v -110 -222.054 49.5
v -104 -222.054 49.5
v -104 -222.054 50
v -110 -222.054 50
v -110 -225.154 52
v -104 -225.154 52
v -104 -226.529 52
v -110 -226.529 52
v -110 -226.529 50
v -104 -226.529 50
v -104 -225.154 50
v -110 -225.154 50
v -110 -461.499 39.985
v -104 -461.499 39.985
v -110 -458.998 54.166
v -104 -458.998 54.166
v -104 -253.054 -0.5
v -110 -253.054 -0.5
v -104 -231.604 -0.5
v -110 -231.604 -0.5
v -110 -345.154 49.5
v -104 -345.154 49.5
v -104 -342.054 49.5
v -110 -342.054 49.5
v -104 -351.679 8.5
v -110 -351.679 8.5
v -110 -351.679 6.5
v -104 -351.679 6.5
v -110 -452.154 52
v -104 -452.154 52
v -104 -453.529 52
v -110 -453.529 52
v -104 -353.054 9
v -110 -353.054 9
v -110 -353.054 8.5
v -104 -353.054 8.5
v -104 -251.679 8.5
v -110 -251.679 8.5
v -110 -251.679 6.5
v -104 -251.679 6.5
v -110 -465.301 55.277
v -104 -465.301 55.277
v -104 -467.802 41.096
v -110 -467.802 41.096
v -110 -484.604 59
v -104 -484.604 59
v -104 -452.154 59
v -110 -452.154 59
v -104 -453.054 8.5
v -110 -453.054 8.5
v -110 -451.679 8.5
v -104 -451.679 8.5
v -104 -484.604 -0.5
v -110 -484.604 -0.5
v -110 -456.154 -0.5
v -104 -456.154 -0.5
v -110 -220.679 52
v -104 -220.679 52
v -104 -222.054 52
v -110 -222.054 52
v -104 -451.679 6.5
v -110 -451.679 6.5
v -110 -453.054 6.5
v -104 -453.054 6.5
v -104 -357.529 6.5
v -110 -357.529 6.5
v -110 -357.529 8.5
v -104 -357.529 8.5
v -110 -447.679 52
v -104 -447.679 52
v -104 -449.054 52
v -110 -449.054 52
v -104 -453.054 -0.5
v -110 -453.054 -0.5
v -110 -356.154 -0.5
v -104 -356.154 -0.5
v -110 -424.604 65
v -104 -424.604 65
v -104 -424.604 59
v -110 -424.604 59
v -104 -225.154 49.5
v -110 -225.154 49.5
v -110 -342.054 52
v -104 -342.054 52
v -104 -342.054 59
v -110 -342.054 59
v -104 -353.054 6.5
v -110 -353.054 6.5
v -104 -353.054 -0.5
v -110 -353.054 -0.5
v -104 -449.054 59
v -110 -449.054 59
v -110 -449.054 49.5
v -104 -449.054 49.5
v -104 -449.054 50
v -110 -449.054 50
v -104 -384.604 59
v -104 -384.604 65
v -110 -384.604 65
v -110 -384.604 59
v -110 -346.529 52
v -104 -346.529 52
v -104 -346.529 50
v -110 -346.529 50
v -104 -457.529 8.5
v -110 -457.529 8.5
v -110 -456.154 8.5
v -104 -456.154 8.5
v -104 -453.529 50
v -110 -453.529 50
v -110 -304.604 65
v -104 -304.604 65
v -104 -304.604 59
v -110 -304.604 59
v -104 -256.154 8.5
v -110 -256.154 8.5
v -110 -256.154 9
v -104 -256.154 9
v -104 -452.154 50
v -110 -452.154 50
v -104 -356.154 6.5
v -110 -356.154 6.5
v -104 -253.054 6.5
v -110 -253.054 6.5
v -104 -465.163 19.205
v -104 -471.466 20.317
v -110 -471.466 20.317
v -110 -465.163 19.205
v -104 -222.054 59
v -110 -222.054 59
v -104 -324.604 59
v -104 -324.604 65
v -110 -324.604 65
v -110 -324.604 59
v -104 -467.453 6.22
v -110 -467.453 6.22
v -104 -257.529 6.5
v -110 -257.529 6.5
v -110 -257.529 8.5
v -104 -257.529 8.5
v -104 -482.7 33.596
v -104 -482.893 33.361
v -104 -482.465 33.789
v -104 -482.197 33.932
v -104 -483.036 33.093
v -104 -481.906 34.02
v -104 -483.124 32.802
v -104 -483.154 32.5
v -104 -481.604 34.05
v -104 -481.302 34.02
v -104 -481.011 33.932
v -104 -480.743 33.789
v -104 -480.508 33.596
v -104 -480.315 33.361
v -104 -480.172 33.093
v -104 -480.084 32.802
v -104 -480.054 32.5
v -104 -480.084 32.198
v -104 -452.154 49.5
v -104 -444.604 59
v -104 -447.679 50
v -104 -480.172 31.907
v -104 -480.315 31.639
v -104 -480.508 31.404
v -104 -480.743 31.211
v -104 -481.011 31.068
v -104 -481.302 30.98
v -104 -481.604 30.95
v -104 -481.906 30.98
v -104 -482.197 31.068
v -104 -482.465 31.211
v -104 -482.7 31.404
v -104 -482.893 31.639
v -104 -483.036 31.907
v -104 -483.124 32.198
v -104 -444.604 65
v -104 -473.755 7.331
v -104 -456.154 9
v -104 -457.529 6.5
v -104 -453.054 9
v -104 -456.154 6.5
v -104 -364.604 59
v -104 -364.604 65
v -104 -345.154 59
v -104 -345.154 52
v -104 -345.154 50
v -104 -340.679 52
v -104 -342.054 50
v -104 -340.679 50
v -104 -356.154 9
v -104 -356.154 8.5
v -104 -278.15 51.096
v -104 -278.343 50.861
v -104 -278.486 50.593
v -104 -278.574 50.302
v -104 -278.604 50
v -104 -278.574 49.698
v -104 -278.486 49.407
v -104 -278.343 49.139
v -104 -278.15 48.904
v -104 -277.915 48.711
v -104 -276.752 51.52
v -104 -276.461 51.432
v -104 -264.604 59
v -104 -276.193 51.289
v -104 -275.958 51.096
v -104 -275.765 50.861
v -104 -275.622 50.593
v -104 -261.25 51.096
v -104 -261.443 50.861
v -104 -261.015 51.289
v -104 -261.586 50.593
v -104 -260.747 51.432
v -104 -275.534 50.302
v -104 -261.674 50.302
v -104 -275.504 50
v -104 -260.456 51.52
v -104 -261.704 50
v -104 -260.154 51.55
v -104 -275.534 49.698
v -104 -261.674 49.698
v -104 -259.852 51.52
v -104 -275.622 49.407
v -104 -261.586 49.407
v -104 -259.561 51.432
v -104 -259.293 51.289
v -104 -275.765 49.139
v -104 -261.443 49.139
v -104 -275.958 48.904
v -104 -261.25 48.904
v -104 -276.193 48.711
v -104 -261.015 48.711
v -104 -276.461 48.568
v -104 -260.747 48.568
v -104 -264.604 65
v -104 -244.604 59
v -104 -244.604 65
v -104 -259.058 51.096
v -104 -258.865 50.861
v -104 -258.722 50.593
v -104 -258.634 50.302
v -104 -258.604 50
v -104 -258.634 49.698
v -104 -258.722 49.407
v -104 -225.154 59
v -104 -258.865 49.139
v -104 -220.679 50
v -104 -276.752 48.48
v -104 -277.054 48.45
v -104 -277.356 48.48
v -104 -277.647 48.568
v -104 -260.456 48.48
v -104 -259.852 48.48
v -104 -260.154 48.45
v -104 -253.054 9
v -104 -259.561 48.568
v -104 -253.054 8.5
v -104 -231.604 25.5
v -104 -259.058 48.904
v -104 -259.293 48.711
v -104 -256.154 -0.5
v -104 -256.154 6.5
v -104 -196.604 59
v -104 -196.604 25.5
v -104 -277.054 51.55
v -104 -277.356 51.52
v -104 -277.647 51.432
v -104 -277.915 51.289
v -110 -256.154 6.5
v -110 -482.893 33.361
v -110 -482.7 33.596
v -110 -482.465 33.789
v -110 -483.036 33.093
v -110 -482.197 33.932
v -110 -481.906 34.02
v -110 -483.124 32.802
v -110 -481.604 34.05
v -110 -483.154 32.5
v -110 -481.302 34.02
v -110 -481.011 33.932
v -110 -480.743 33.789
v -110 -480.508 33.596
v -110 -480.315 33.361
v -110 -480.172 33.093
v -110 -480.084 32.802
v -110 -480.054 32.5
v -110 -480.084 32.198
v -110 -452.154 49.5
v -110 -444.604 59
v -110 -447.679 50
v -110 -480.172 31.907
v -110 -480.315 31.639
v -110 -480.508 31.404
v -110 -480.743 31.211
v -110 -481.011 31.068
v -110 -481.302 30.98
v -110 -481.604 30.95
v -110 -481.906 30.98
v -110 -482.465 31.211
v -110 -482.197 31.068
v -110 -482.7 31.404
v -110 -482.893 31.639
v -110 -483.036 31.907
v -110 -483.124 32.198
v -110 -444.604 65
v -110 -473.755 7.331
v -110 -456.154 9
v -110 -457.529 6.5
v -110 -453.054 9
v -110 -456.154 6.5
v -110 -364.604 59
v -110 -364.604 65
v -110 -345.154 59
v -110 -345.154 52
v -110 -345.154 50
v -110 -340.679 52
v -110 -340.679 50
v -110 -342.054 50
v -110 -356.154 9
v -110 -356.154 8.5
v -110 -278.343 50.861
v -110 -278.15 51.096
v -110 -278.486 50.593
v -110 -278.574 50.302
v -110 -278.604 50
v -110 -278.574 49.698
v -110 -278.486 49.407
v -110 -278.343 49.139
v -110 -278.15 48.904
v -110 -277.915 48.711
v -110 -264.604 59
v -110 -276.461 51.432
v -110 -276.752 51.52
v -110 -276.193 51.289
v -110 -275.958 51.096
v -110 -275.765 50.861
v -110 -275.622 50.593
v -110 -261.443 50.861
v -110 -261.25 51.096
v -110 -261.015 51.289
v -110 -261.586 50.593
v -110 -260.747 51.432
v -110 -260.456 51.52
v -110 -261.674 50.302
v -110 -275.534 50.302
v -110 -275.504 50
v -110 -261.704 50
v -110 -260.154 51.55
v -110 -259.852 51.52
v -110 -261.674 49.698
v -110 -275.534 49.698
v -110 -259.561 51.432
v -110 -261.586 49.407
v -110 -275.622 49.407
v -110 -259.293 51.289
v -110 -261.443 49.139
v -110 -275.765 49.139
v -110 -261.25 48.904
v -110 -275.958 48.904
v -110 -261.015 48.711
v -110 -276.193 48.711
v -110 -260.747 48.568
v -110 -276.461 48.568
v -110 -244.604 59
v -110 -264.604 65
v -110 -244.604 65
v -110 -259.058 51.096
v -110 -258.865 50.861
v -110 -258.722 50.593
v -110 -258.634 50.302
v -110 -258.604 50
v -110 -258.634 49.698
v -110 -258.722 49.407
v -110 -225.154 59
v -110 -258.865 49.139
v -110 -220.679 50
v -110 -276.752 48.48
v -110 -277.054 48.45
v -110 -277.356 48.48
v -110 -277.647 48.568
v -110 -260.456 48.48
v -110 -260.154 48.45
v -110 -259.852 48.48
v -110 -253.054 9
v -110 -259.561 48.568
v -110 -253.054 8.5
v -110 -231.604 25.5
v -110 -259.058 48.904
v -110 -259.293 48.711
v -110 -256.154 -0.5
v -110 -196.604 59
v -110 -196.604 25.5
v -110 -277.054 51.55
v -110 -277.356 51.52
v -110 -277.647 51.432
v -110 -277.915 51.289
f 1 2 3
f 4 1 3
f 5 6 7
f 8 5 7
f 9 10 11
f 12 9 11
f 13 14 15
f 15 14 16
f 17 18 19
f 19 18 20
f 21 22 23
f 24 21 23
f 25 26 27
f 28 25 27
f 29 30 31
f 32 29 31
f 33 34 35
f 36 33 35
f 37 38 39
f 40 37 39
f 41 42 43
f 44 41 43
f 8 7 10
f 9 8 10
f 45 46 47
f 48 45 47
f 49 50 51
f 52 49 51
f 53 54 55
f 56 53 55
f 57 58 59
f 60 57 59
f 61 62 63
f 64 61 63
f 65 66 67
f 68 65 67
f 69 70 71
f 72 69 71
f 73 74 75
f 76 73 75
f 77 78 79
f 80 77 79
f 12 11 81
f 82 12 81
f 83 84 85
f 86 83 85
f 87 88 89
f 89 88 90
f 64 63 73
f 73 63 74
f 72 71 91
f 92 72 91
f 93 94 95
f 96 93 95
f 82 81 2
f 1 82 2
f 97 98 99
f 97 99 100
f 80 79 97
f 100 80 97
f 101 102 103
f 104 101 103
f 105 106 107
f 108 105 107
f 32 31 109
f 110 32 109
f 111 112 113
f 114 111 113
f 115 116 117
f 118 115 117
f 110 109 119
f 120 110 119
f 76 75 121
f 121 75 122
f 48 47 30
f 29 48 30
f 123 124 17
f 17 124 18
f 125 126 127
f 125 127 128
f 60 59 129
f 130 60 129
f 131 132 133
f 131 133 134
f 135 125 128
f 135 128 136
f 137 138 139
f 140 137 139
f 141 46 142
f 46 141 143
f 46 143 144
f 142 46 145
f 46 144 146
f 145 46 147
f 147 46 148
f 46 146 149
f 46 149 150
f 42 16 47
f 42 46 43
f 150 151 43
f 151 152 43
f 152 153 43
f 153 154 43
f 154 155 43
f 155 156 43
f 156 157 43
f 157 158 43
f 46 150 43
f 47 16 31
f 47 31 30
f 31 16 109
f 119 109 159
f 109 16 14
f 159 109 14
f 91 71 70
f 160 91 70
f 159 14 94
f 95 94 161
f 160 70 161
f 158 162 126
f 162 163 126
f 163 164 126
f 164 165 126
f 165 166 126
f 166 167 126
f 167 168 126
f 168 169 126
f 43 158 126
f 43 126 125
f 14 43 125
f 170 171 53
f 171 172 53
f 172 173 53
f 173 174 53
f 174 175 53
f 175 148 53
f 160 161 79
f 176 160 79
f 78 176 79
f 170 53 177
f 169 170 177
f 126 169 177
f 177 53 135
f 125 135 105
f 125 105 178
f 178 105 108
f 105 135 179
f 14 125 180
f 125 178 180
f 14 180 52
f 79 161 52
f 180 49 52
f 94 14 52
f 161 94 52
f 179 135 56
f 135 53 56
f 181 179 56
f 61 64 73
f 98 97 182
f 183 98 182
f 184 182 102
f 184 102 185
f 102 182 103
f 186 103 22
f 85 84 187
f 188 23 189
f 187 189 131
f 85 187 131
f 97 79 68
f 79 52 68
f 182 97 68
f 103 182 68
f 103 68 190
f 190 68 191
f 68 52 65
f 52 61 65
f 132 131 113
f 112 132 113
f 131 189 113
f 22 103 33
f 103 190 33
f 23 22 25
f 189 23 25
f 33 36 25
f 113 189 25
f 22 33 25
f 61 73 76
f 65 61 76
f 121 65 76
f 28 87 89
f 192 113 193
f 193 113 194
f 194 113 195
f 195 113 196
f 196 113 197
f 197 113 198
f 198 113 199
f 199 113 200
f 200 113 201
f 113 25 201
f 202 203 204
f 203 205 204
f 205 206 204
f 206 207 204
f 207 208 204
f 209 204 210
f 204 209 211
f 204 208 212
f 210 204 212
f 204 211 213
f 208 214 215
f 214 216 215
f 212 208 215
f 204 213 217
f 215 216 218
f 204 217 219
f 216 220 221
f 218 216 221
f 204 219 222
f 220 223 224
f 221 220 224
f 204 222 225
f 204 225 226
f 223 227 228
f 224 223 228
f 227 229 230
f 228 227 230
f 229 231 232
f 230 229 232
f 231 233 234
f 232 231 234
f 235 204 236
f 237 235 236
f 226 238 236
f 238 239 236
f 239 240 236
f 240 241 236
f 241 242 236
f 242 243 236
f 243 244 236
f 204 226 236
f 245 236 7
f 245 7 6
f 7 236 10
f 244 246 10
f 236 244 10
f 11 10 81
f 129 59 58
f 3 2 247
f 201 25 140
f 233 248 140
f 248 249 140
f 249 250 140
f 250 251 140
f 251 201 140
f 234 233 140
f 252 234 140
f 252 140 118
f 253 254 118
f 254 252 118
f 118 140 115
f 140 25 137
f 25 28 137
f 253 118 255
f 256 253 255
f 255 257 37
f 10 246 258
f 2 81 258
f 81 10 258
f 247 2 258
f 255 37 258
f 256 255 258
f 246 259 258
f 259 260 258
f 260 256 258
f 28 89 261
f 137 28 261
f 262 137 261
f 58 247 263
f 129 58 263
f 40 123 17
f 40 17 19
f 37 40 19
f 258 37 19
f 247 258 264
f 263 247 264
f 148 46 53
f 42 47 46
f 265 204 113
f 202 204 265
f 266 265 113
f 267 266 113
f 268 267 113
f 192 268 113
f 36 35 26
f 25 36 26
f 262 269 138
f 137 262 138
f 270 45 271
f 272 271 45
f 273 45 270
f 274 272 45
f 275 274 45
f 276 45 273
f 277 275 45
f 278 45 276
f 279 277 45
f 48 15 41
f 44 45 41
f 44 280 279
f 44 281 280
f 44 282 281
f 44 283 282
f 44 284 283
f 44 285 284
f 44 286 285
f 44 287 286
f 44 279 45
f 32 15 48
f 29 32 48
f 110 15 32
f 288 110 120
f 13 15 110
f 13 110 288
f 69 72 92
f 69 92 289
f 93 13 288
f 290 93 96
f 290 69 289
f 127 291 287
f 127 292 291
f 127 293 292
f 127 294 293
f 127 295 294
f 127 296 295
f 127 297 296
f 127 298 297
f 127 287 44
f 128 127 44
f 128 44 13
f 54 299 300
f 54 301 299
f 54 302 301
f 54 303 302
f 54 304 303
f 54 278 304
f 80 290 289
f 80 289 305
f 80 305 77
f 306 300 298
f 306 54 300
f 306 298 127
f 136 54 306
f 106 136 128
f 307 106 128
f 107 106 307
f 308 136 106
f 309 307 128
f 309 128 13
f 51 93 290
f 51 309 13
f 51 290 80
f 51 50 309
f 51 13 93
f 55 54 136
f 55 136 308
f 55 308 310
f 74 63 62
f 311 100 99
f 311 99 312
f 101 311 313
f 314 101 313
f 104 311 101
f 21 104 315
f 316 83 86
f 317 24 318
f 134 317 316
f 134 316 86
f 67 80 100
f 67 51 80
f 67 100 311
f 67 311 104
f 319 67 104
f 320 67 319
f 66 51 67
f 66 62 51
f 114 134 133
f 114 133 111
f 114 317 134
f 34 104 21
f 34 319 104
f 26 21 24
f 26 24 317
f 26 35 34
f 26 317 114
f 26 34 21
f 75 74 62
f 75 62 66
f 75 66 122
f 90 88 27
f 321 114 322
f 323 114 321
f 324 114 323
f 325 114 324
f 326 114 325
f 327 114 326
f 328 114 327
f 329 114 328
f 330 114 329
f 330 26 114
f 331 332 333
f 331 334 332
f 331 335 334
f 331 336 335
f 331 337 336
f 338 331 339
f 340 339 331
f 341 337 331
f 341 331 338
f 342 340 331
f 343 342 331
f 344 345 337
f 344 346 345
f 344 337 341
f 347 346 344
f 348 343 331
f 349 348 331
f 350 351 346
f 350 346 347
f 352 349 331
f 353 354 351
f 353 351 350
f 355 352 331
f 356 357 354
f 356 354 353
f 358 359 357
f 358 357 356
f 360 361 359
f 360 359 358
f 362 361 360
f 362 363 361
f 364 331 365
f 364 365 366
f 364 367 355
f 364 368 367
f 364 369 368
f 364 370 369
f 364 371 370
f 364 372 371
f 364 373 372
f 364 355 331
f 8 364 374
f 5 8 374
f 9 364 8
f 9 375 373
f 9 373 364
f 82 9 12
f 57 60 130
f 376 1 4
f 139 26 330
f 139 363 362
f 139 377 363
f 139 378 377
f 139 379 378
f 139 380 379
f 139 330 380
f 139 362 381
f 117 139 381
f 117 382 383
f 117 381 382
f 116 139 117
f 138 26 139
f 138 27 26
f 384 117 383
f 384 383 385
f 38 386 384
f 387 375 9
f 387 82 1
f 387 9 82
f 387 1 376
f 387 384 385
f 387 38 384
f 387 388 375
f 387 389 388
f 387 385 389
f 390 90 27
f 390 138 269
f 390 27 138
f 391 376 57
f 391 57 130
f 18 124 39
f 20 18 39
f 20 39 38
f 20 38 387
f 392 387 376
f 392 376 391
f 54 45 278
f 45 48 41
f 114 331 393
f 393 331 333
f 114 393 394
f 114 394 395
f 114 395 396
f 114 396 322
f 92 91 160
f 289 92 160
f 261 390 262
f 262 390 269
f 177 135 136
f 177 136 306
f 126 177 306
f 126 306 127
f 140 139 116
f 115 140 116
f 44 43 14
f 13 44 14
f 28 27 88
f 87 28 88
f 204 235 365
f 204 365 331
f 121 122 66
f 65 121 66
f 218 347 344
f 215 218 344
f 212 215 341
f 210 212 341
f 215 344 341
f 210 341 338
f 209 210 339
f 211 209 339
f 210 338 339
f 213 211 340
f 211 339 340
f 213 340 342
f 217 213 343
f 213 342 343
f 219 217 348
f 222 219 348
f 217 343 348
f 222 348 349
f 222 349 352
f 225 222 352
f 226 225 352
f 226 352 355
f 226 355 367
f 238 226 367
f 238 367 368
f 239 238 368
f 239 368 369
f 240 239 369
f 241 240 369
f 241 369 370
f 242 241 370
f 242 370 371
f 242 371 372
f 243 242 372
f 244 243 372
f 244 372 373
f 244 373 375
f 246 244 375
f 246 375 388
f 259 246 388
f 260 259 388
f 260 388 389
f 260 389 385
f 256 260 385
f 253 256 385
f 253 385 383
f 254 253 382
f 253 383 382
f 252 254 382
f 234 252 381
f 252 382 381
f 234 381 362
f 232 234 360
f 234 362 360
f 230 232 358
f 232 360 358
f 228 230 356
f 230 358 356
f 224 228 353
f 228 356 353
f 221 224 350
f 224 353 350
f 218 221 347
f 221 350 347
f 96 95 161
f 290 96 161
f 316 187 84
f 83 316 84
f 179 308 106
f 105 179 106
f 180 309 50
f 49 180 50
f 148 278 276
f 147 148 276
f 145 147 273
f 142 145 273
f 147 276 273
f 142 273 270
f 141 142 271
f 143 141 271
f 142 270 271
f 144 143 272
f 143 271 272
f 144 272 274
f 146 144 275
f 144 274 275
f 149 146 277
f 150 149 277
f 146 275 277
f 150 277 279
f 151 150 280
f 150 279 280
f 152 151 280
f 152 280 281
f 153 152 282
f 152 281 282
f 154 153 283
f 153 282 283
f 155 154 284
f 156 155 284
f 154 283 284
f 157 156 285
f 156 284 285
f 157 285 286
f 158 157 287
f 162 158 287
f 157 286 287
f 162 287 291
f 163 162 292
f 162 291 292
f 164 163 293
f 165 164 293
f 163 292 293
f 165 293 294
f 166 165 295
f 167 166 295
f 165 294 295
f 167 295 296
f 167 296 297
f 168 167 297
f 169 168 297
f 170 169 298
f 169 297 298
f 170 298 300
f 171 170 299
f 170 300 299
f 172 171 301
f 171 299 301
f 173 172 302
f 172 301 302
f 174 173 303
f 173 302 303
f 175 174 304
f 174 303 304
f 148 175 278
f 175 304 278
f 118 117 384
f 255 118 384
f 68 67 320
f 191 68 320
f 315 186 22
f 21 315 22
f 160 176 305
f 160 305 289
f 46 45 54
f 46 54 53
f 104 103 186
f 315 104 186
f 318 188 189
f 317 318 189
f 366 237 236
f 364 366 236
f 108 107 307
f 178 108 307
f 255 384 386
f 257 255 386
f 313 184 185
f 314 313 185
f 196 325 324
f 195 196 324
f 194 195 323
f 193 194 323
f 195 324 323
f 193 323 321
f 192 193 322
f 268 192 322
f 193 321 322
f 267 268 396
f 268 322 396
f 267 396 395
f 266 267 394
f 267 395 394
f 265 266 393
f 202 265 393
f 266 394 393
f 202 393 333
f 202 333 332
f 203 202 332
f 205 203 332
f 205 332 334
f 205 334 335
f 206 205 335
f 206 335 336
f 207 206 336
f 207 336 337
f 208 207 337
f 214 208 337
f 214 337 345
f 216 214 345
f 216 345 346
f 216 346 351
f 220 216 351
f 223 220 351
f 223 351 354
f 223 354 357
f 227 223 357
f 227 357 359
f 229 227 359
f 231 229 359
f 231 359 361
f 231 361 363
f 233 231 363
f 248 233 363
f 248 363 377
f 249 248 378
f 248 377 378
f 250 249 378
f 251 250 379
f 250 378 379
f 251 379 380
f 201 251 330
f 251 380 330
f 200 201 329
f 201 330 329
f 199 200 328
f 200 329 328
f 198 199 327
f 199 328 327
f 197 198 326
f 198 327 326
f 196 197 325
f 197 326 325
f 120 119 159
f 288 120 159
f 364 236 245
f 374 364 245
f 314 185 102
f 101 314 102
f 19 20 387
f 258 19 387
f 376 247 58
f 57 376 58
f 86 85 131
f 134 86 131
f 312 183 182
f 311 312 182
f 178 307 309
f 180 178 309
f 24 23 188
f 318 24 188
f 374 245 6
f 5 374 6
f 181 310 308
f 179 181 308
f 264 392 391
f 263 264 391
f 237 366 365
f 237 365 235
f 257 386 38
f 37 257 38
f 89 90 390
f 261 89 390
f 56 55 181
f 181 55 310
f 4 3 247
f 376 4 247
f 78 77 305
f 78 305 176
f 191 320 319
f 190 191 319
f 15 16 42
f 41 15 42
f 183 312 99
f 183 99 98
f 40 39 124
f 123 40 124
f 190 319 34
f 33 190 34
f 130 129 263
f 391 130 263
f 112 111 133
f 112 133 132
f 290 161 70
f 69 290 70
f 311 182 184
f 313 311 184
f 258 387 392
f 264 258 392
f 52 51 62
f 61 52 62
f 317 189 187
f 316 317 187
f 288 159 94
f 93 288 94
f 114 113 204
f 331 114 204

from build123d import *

# Parameters (mm, degrees)
DODANIE_WYCI_GNI_CIE1_DEPTH      = 65
DODANIE_WYCI_GNI_CIE1_DEPTH_BACK = 6.5
SZKIC1_W                         = 6
SZKIC1_H                         = 318
WYTNIJ_WYCI_GNI_CIE1_DEPTH       = 6
SZKIC4_W                         = 6
SZKIC4_H                         = 253
WYTNIJ_WYCI_GNI_CIE2_DEPTH       = 6
WYTNIJ_WYCI_GNI_CIE3_DEPTH       = 6
SZYK_LINIOWY2_COUNT              = 2
SZYK_LINIOWY2_PITCH              = 100
SZYK_LINIOWY2_COL_COUNT          = 2
SZYK_LINIOWY2_COL_PITCH          = 200
SZKIC6_W                         = 6
SZKIC6_H                         = 40
WYTNIJ_WYCI_GNI_CIE4_DEPTH       = 6
SZYK_LINIOWY3_COUNT              = 6
SZYK_LINIOWY3_PITCH              = 60
SZYK_LINIOWY3_COUNT_DIR2         = 2
SZYK_LINIOWY3_PITCH_DIR2         = 250
WYTNIJ_WYCI_GNI_CIE5_DEPTH       = 6
SZYK_LINIOWY4_COUNT              = 2
SZYK_LINIOWY4_PITCH              = 107
SZYK_LINIOWY4_COL_COUNT          = 2
SZYK_LINIOWY4_COL_PITCH          = 227
SZKIC9_R                         = 1.55
WYTNIJ_WYCI_GNI_CIE6_DEPTH       = 6
WYTNIJ_WYCI_GNI_CIE7_DEPTH       = 6
SZKIC13_R                        = 1.55
WYTNIJ_WYCI_GNI_CIE9_DEPTH       = 10


with BuildPart() as part:
    # Szkic1 → Dodanie-wyciągnięcie1 (new, two sides: drawn at the far end of the back side and taken through both)
    with BuildSketch(Plane.XY.offset(-DODANIE_WYCI_GNI_CIE1_DEPTH_BACK)):
        with Locations((-107, -325.603962956)):
            Rectangle(SZKIC1_W, SZKIC1_H)
    extrude(amount=DODANIE_WYCI_GNI_CIE1_DEPTH + DODANIE_WYCI_GNI_CIE1_DEPTH_BACK)

    # Szkic2 → Wytnij-wyciągnięcie1 (cut)
    with BuildSketch(Plane.ZY.offset(110)):
        Polygon((-6.5, -231.603962956), (25.5, -231.603962956), (25.5, -196.603962956), (65, -196.603962956), (65, -166.603962956), (-6.5, -166.603962956), align=None)
    extrude(amount=-WYTNIJ_WYCI_GNI_CIE1_DEPTH, mode=Mode.SUBTRACT)

    # Szkic4 → Wytnij-wyciągnięcie2 (cut)
    with BuildSketch(Plane.ZY.offset(110)):
        with Locations((-3.5, -358.103962956)):
            Rectangle(SZKIC4_W, SZKIC4_H)
    extrude(amount=-WYTNIJ_WYCI_GNI_CIE2_DEPTH, mode=Mode.SUBTRACT)

    # Szkic5 → Wytnij-wyciągnięcie3 (cut)
    with BuildSketch(Plane.ZY.offset(110)):
        Polygon((-0.5, -453.053962956), (-0.5, -456.153962956), (6.5, -456.153962956), (6.5, -457.528962956), (8.5, -457.528962956), (8.5, -456.153962956), (9, -456.153962956), (9, -453.053962956), (8.5, -453.053962956), (8.5, -451.678962956), (6.5, -451.678962956), (6.5, -453.053962956), align=None)
    wytnij_wyci_gni_cie3 = extrude(amount=-WYTNIJ_WYCI_GNI_CIE3_DEPTH, mode=Mode.SUBTRACT)

    # Szyk liniowy2: Wytnij-wyciągnięcie3 ×2
    with Locations(*[(0, i * SZYK_LINIOWY2_PITCH, 0) for i in range(1, SZYK_LINIOWY2_COUNT)]):
        add(wytnij_wyci_gni_cie3, mode=Mode.SUBTRACT)

    # Szyk liniowy2 col: Wytnij-wyciągnięcie3 ×2
    with Locations(*[(0, i * SZYK_LINIOWY2_COL_PITCH, 0) for i in range(1, SZYK_LINIOWY2_COL_COUNT)]):
        add(wytnij_wyci_gni_cie3, mode=Mode.SUBTRACT)

    # Szkic6 → Wytnij-wyciągnięcie4 (cut)
    with BuildSketch(Plane(origin=(-104, 0, 0), x_dir=(0, 0, -1), z_dir=(1, 0, 0))):
        with Locations((-62, -464.603962956)):
            Rectangle(SZKIC6_W, SZKIC6_H)
    wytnij_wyci_gni_cie4 = extrude(amount=-WYTNIJ_WYCI_GNI_CIE4_DEPTH, mode=Mode.SUBTRACT)

    # Szyk liniowy3: Wytnij-wyci_gni_cie4 6 × 2
    with Locations(*[Vector(0, 1, 0) * (i * SZYK_LINIOWY3_PITCH) + Vector(0, 1, 0) * (j * SZYK_LINIOWY3_PITCH_DIR2) for i in range(SZYK_LINIOWY3_COUNT) for j in range(SZYK_LINIOWY3_COUNT_DIR2) if (i, j) != (0, 0)]):
        add(wytnij_wyci_gni_cie4, mode=Mode.SUBTRACT)

    # Szkic7 → Wytnij-wyciągnięcie5 (cut)
    with BuildSketch(Plane(origin=(-104, 0, 0), x_dir=(0, 0, -1), z_dir=(1, 0, 0))):
        Polygon((-59, -449.053962956), (-59, -452.153962956), (-52, -452.153962956), (-52, -453.528962956), (-50, -453.528962956), (-50, -452.153962956), (-49.5, -452.153962956), (-49.5, -449.053962956), (-50, -449.053962956), (-50, -447.678962956), (-52, -447.678962956), (-52, -449.053962956), align=None)
    wytnij_wyci_gni_cie5 = extrude(amount=-WYTNIJ_WYCI_GNI_CIE5_DEPTH, mode=Mode.SUBTRACT)

    # Szyk liniowy4: Wytnij-wyciągnięcie5 ×2
    with Locations(*[(0, i * SZYK_LINIOWY4_PITCH, 0) for i in range(1, SZYK_LINIOWY4_COUNT)]):
        add(wytnij_wyci_gni_cie5, mode=Mode.SUBTRACT)

    # Szyk liniowy4 col: Wytnij-wyciągnięcie5 ×2
    with Locations(*[(0, i * SZYK_LINIOWY4_COL_PITCH, 0) for i in range(1, SZYK_LINIOWY4_COL_COUNT)]):
        add(wytnij_wyci_gni_cie5, mode=Mode.SUBTRACT)

    # Szkic9 → Wytnij-wyciągnięcie6 (cut)
    with BuildSketch(Plane.ZY.offset(110)):
        with Locations(Location((32.500000044, -481.603962956, 0), (0, 0, 270))):
            Circle(SZKIC9_R)
    extrude(amount=-WYTNIJ_WYCI_GNI_CIE6_DEPTH, mode=Mode.SUBTRACT)

    # Szkic11 → Wytnij-wyciągnięcie7 (cut)
    with BuildSketch(Plane(origin=(-104, 0, 0), x_dir=(0, 0, -1), z_dir=(1, 0, 0))):
        Polygon((-19.205244402, -465.162826439), (-6.219752977, -467.452518935), (-7.331101314, -473.755288555), (-20.316592739, -471.465596059), align=None)
        Polygon((-39.98468799, -461.498849891), (-54.165919634, -458.998316132), (-55.277267971, -465.301085752), (-41.096036327, -467.80161951), align=None)
    extrude(amount=-WYTNIJ_WYCI_GNI_CIE7_DEPTH, mode=Mode.SUBTRACT)

    # Szkic13 → Wytnij-wyciągnięcie9 (cut)
    with BuildSketch(Plane.ZY.offset(110)):
        with Locations(Location((50.000000044, -260.153962956, 0), (0, 0, 270))):
            Circle(SZKIC13_R)
        with Locations(Location((50.000000044, -277.053962956, 0), (0, 0, 270))):
            Circle(SZKIC13_R)
    extrude(amount=-WYTNIJ_WYCI_GNI_CIE9_DEPTH, mode=Mode.SUBTRACT)


solid = part.part
